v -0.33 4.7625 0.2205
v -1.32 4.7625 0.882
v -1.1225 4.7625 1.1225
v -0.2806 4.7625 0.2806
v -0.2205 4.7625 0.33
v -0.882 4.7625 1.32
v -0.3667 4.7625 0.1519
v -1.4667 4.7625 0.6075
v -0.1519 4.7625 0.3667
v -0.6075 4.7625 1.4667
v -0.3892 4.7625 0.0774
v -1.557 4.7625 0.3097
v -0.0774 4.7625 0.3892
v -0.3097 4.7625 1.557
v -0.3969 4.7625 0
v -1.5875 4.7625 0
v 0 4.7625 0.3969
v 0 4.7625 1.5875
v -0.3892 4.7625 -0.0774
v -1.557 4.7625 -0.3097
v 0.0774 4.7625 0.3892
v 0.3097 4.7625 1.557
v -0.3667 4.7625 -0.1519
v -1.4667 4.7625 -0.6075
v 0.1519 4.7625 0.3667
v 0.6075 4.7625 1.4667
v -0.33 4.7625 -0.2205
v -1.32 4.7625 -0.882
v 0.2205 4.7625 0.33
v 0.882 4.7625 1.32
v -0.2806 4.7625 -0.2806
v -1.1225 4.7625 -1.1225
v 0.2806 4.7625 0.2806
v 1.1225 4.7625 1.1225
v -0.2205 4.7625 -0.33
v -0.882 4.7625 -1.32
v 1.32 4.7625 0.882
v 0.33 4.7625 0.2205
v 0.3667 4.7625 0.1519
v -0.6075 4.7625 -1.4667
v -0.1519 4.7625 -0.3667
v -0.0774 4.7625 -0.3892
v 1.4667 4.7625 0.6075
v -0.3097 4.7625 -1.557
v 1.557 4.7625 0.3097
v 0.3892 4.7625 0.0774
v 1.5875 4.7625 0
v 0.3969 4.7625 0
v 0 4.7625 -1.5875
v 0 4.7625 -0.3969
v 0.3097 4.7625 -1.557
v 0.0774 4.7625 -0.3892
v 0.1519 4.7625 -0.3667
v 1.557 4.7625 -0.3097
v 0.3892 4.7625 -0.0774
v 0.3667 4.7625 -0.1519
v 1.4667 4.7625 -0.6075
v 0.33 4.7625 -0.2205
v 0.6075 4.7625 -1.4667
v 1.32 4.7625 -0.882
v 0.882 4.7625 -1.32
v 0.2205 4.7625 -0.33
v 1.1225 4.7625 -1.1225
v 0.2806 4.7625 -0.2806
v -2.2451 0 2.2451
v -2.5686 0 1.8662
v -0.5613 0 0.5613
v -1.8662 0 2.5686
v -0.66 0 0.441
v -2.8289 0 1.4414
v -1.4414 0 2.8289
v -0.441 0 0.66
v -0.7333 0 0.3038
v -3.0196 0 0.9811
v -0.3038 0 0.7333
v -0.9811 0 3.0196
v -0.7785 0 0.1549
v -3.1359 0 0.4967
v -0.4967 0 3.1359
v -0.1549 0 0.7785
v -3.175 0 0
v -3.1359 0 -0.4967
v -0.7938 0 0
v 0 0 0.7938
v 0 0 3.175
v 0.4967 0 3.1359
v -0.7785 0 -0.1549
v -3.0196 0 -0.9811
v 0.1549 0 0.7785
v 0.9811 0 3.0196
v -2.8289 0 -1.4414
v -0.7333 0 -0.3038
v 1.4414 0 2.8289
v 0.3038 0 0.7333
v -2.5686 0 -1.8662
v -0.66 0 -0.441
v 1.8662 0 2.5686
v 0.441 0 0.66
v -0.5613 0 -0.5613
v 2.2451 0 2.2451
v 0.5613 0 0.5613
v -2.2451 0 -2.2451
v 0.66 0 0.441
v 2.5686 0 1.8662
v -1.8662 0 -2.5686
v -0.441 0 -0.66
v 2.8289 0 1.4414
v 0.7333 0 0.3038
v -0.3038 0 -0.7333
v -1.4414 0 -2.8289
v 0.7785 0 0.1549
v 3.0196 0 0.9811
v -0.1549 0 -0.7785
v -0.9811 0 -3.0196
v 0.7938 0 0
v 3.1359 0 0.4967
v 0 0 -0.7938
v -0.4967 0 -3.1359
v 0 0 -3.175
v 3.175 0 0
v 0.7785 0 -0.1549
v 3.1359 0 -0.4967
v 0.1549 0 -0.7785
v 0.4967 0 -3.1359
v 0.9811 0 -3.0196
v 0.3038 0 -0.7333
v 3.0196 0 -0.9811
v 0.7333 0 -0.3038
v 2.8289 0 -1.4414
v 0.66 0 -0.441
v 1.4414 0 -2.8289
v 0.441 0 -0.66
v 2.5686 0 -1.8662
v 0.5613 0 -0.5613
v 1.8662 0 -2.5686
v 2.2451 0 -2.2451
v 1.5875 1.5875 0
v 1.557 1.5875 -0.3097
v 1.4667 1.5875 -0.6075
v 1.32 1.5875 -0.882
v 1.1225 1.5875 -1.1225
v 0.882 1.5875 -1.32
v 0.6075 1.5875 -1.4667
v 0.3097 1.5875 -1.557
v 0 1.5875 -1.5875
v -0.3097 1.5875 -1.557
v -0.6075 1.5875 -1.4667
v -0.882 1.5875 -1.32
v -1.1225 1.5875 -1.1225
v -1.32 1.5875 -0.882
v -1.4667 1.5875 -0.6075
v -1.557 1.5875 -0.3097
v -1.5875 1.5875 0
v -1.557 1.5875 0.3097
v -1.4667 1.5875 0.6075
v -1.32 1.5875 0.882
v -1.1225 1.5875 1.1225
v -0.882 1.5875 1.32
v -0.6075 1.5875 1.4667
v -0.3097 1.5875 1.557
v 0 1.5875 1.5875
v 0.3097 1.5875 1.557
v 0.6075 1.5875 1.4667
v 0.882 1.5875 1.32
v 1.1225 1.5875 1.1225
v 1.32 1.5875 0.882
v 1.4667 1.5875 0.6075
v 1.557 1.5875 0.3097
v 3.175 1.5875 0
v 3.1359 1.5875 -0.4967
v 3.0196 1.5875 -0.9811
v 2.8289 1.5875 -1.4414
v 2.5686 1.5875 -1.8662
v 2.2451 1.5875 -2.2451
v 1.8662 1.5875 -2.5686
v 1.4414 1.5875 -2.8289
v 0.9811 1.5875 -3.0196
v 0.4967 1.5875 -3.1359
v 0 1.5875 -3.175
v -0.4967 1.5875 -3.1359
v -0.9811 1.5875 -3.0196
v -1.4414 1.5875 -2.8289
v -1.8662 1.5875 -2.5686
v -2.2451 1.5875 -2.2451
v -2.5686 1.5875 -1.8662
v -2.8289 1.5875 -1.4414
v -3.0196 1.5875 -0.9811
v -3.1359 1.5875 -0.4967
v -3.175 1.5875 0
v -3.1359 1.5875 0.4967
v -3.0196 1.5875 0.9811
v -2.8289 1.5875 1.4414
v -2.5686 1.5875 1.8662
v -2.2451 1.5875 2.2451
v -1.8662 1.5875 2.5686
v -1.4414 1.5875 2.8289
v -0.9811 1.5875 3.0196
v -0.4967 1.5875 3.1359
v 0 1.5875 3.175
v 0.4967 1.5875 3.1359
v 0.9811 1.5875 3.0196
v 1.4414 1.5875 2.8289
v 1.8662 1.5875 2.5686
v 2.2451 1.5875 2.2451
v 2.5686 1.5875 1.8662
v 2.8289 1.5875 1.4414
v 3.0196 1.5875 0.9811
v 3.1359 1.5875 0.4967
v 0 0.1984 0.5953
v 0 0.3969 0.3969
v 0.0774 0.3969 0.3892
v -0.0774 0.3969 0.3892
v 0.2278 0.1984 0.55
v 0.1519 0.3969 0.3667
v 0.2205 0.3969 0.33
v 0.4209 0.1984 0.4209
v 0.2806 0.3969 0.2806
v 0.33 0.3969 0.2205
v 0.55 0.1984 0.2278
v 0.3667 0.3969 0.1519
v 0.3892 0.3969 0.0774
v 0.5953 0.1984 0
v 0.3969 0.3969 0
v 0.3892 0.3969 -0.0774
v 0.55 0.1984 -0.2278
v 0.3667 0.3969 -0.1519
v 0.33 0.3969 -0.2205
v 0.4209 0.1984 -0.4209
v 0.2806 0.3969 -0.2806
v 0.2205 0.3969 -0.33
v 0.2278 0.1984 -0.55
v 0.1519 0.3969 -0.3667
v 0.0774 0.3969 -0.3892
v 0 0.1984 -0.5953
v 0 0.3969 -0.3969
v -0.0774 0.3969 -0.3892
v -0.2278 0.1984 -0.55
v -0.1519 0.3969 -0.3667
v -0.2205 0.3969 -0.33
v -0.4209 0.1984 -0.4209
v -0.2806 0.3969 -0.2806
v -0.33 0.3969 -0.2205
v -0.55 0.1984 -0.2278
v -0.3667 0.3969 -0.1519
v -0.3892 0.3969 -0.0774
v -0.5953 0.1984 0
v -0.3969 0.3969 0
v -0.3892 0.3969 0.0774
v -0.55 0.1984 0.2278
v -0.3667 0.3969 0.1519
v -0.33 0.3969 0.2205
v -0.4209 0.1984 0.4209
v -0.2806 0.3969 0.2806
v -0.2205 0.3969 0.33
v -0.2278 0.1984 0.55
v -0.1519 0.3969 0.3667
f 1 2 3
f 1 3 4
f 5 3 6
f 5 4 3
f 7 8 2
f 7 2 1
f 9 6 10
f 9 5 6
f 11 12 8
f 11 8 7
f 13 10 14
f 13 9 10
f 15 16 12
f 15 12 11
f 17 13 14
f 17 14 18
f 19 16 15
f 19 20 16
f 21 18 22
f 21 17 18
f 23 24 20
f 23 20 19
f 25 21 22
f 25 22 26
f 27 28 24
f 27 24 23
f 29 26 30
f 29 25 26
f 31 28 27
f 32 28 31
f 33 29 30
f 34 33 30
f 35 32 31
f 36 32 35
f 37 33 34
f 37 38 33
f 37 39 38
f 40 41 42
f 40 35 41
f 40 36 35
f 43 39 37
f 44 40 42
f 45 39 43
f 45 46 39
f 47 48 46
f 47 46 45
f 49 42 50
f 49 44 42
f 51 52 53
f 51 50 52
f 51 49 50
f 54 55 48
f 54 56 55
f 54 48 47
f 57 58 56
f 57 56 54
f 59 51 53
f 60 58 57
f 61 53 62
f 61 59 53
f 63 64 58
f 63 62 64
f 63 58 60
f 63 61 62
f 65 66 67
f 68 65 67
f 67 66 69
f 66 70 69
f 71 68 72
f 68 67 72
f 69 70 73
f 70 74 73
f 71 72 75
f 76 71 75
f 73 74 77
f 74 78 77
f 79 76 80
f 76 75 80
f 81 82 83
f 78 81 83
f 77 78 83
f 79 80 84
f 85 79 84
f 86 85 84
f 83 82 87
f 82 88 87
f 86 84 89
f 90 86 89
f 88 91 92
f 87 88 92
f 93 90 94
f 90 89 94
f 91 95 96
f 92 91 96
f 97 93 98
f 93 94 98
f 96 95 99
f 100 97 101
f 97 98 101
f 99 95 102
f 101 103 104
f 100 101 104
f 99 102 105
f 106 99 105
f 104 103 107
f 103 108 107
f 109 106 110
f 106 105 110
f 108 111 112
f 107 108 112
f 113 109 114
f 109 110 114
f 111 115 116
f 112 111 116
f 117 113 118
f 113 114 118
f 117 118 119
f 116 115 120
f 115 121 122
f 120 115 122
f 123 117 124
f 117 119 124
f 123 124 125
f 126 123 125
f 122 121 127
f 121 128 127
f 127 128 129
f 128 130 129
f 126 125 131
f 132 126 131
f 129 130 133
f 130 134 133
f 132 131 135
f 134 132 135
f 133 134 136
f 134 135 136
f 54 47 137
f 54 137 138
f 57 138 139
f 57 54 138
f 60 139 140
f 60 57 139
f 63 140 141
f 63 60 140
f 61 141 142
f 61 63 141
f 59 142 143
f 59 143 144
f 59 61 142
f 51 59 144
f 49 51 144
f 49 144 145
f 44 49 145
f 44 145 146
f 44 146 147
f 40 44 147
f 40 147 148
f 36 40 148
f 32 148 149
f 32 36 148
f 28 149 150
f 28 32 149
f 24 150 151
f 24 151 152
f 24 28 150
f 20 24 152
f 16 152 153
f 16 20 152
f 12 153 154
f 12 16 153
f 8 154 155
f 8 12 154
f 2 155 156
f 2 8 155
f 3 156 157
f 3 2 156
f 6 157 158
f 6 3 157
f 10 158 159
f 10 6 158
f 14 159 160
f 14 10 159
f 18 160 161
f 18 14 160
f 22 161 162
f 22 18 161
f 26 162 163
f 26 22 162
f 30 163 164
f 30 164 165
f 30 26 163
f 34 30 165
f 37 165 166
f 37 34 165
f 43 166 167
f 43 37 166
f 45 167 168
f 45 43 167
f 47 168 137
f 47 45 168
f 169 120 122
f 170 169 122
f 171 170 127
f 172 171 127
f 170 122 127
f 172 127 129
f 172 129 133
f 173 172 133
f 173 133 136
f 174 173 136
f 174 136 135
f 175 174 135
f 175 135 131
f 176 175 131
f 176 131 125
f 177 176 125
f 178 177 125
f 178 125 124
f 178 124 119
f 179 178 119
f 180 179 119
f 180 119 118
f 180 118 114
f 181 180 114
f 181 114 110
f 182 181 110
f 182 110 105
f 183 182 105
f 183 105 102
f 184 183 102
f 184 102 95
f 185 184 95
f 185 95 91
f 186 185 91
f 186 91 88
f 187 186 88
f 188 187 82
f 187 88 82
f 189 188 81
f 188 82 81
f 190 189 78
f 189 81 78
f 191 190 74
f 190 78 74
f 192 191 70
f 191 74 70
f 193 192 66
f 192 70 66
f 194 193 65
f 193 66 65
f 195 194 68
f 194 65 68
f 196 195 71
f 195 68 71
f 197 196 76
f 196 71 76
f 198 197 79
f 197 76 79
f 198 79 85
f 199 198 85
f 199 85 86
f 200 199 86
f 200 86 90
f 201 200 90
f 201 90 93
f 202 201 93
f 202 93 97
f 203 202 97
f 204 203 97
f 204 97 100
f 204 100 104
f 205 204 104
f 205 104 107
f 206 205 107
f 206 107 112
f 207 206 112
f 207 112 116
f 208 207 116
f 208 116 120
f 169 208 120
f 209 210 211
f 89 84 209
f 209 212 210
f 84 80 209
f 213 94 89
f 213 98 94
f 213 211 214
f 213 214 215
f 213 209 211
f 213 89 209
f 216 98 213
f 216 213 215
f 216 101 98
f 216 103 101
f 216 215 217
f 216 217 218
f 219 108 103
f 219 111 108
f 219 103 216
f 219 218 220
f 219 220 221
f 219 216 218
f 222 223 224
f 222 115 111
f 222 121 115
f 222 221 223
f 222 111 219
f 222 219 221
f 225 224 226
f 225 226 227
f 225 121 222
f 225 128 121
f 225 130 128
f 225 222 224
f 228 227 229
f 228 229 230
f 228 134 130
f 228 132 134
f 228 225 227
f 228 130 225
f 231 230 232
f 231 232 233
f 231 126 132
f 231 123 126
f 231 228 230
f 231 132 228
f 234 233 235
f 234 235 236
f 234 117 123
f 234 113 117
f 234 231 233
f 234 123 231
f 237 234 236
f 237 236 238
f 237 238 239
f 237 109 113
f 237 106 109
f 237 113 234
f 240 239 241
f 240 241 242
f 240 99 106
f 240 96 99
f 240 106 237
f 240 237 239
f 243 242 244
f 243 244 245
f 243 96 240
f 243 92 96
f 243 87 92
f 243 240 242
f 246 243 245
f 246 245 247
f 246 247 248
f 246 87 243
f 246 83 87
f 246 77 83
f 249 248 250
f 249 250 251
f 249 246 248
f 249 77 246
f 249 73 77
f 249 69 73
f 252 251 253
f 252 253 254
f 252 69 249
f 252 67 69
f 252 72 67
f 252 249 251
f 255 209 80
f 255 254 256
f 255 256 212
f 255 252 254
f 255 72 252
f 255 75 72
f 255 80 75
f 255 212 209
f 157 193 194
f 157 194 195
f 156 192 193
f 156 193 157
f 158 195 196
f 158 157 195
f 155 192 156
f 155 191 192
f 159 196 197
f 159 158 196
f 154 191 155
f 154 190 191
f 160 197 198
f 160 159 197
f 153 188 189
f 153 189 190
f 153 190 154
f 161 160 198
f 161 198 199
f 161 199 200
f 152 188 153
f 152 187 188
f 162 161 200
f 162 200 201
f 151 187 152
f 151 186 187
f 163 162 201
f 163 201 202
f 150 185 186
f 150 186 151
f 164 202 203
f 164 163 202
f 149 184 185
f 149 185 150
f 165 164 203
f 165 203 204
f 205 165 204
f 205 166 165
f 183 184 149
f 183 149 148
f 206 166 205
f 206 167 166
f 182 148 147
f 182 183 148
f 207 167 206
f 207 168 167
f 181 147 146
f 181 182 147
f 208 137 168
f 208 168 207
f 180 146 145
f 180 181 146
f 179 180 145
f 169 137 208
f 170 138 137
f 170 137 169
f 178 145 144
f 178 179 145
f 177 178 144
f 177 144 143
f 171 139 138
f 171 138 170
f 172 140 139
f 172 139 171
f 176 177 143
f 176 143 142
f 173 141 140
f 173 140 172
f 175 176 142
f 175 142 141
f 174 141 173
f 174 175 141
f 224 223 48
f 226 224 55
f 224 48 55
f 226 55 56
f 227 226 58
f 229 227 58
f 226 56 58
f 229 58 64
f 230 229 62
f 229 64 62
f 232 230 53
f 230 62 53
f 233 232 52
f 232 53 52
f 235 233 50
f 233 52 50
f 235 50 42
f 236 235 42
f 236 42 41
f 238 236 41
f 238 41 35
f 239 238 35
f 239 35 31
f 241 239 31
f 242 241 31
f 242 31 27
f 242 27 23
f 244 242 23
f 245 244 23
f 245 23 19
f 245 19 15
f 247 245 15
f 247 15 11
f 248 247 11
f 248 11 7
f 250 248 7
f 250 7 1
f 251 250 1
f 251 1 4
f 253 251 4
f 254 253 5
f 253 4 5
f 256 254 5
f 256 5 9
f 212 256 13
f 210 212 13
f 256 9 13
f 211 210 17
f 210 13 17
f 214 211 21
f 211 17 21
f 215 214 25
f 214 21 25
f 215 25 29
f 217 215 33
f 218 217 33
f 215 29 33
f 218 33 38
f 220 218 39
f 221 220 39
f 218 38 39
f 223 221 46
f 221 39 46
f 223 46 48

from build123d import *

# Parameters (mm, degrees)
SKETCH1_R           = 3.175
BOSS_EXTRUDE1_DEPTH = 4.7625
SKETCH2_R           = 3.175
SKETCH2_R_2         = 1.5875
CUT_EXTRUDE1_DEPTH  = 3.175
SKETCH3_R           = 0.396875
CUT_EXTRUDE2_DEPTH  = 5.7625


with BuildPart() as part:
    # Sketch1 → Boss-Extrude1 (new body)
    with BuildSketch(Plane(origin=(0, 0, 0), x_dir=(1, 0, 0), z_dir=(0, 1, 0))):
        Circle(SKETCH1_R)
    extrude(amount=BOSS_EXTRUDE1_DEPTH)

    # Sketch2 → Cut-Extrude1 (cut)
    with BuildSketch(Plane(origin=(0, 4.7625, 0), x_dir=(1, 0, 0), z_dir=(0, 1, 0))):
        Circle(SKETCH2_R)
        Circle(SKETCH2_R_2, mode=Mode.SUBTRACT)
    extrude(amount=-CUT_EXTRUDE1_DEPTH, mode=Mode.SUBTRACT)

    # Sketch3 → Cut-Extrude2 (cut, through all)
    with BuildSketch(Plane(origin=(0, 4.7625, 0), x_dir=(1, 0, 0), z_dir=(0, 1, 0))):
        Circle(SKETCH3_R)
    extrude(amount=-CUT_EXTRUDE2_DEPTH, mode=Mode.SUBTRACT)

    # Sketch4 → Cut-Revolve1 (revolve, cut)
    with BuildSketch(Plane(origin=(0, 0, 0), x_dir=(0, 0, -1), z_dir=(1, 0, 0))):
        Polygon((0, 0), (0, 0.79375), (-0.79375, 0), align=None)
    revolve(axis=Axis((0, 0, 0), (0, 1, 0)), mode=Mode.SUBTRACT)


solid = part.part
